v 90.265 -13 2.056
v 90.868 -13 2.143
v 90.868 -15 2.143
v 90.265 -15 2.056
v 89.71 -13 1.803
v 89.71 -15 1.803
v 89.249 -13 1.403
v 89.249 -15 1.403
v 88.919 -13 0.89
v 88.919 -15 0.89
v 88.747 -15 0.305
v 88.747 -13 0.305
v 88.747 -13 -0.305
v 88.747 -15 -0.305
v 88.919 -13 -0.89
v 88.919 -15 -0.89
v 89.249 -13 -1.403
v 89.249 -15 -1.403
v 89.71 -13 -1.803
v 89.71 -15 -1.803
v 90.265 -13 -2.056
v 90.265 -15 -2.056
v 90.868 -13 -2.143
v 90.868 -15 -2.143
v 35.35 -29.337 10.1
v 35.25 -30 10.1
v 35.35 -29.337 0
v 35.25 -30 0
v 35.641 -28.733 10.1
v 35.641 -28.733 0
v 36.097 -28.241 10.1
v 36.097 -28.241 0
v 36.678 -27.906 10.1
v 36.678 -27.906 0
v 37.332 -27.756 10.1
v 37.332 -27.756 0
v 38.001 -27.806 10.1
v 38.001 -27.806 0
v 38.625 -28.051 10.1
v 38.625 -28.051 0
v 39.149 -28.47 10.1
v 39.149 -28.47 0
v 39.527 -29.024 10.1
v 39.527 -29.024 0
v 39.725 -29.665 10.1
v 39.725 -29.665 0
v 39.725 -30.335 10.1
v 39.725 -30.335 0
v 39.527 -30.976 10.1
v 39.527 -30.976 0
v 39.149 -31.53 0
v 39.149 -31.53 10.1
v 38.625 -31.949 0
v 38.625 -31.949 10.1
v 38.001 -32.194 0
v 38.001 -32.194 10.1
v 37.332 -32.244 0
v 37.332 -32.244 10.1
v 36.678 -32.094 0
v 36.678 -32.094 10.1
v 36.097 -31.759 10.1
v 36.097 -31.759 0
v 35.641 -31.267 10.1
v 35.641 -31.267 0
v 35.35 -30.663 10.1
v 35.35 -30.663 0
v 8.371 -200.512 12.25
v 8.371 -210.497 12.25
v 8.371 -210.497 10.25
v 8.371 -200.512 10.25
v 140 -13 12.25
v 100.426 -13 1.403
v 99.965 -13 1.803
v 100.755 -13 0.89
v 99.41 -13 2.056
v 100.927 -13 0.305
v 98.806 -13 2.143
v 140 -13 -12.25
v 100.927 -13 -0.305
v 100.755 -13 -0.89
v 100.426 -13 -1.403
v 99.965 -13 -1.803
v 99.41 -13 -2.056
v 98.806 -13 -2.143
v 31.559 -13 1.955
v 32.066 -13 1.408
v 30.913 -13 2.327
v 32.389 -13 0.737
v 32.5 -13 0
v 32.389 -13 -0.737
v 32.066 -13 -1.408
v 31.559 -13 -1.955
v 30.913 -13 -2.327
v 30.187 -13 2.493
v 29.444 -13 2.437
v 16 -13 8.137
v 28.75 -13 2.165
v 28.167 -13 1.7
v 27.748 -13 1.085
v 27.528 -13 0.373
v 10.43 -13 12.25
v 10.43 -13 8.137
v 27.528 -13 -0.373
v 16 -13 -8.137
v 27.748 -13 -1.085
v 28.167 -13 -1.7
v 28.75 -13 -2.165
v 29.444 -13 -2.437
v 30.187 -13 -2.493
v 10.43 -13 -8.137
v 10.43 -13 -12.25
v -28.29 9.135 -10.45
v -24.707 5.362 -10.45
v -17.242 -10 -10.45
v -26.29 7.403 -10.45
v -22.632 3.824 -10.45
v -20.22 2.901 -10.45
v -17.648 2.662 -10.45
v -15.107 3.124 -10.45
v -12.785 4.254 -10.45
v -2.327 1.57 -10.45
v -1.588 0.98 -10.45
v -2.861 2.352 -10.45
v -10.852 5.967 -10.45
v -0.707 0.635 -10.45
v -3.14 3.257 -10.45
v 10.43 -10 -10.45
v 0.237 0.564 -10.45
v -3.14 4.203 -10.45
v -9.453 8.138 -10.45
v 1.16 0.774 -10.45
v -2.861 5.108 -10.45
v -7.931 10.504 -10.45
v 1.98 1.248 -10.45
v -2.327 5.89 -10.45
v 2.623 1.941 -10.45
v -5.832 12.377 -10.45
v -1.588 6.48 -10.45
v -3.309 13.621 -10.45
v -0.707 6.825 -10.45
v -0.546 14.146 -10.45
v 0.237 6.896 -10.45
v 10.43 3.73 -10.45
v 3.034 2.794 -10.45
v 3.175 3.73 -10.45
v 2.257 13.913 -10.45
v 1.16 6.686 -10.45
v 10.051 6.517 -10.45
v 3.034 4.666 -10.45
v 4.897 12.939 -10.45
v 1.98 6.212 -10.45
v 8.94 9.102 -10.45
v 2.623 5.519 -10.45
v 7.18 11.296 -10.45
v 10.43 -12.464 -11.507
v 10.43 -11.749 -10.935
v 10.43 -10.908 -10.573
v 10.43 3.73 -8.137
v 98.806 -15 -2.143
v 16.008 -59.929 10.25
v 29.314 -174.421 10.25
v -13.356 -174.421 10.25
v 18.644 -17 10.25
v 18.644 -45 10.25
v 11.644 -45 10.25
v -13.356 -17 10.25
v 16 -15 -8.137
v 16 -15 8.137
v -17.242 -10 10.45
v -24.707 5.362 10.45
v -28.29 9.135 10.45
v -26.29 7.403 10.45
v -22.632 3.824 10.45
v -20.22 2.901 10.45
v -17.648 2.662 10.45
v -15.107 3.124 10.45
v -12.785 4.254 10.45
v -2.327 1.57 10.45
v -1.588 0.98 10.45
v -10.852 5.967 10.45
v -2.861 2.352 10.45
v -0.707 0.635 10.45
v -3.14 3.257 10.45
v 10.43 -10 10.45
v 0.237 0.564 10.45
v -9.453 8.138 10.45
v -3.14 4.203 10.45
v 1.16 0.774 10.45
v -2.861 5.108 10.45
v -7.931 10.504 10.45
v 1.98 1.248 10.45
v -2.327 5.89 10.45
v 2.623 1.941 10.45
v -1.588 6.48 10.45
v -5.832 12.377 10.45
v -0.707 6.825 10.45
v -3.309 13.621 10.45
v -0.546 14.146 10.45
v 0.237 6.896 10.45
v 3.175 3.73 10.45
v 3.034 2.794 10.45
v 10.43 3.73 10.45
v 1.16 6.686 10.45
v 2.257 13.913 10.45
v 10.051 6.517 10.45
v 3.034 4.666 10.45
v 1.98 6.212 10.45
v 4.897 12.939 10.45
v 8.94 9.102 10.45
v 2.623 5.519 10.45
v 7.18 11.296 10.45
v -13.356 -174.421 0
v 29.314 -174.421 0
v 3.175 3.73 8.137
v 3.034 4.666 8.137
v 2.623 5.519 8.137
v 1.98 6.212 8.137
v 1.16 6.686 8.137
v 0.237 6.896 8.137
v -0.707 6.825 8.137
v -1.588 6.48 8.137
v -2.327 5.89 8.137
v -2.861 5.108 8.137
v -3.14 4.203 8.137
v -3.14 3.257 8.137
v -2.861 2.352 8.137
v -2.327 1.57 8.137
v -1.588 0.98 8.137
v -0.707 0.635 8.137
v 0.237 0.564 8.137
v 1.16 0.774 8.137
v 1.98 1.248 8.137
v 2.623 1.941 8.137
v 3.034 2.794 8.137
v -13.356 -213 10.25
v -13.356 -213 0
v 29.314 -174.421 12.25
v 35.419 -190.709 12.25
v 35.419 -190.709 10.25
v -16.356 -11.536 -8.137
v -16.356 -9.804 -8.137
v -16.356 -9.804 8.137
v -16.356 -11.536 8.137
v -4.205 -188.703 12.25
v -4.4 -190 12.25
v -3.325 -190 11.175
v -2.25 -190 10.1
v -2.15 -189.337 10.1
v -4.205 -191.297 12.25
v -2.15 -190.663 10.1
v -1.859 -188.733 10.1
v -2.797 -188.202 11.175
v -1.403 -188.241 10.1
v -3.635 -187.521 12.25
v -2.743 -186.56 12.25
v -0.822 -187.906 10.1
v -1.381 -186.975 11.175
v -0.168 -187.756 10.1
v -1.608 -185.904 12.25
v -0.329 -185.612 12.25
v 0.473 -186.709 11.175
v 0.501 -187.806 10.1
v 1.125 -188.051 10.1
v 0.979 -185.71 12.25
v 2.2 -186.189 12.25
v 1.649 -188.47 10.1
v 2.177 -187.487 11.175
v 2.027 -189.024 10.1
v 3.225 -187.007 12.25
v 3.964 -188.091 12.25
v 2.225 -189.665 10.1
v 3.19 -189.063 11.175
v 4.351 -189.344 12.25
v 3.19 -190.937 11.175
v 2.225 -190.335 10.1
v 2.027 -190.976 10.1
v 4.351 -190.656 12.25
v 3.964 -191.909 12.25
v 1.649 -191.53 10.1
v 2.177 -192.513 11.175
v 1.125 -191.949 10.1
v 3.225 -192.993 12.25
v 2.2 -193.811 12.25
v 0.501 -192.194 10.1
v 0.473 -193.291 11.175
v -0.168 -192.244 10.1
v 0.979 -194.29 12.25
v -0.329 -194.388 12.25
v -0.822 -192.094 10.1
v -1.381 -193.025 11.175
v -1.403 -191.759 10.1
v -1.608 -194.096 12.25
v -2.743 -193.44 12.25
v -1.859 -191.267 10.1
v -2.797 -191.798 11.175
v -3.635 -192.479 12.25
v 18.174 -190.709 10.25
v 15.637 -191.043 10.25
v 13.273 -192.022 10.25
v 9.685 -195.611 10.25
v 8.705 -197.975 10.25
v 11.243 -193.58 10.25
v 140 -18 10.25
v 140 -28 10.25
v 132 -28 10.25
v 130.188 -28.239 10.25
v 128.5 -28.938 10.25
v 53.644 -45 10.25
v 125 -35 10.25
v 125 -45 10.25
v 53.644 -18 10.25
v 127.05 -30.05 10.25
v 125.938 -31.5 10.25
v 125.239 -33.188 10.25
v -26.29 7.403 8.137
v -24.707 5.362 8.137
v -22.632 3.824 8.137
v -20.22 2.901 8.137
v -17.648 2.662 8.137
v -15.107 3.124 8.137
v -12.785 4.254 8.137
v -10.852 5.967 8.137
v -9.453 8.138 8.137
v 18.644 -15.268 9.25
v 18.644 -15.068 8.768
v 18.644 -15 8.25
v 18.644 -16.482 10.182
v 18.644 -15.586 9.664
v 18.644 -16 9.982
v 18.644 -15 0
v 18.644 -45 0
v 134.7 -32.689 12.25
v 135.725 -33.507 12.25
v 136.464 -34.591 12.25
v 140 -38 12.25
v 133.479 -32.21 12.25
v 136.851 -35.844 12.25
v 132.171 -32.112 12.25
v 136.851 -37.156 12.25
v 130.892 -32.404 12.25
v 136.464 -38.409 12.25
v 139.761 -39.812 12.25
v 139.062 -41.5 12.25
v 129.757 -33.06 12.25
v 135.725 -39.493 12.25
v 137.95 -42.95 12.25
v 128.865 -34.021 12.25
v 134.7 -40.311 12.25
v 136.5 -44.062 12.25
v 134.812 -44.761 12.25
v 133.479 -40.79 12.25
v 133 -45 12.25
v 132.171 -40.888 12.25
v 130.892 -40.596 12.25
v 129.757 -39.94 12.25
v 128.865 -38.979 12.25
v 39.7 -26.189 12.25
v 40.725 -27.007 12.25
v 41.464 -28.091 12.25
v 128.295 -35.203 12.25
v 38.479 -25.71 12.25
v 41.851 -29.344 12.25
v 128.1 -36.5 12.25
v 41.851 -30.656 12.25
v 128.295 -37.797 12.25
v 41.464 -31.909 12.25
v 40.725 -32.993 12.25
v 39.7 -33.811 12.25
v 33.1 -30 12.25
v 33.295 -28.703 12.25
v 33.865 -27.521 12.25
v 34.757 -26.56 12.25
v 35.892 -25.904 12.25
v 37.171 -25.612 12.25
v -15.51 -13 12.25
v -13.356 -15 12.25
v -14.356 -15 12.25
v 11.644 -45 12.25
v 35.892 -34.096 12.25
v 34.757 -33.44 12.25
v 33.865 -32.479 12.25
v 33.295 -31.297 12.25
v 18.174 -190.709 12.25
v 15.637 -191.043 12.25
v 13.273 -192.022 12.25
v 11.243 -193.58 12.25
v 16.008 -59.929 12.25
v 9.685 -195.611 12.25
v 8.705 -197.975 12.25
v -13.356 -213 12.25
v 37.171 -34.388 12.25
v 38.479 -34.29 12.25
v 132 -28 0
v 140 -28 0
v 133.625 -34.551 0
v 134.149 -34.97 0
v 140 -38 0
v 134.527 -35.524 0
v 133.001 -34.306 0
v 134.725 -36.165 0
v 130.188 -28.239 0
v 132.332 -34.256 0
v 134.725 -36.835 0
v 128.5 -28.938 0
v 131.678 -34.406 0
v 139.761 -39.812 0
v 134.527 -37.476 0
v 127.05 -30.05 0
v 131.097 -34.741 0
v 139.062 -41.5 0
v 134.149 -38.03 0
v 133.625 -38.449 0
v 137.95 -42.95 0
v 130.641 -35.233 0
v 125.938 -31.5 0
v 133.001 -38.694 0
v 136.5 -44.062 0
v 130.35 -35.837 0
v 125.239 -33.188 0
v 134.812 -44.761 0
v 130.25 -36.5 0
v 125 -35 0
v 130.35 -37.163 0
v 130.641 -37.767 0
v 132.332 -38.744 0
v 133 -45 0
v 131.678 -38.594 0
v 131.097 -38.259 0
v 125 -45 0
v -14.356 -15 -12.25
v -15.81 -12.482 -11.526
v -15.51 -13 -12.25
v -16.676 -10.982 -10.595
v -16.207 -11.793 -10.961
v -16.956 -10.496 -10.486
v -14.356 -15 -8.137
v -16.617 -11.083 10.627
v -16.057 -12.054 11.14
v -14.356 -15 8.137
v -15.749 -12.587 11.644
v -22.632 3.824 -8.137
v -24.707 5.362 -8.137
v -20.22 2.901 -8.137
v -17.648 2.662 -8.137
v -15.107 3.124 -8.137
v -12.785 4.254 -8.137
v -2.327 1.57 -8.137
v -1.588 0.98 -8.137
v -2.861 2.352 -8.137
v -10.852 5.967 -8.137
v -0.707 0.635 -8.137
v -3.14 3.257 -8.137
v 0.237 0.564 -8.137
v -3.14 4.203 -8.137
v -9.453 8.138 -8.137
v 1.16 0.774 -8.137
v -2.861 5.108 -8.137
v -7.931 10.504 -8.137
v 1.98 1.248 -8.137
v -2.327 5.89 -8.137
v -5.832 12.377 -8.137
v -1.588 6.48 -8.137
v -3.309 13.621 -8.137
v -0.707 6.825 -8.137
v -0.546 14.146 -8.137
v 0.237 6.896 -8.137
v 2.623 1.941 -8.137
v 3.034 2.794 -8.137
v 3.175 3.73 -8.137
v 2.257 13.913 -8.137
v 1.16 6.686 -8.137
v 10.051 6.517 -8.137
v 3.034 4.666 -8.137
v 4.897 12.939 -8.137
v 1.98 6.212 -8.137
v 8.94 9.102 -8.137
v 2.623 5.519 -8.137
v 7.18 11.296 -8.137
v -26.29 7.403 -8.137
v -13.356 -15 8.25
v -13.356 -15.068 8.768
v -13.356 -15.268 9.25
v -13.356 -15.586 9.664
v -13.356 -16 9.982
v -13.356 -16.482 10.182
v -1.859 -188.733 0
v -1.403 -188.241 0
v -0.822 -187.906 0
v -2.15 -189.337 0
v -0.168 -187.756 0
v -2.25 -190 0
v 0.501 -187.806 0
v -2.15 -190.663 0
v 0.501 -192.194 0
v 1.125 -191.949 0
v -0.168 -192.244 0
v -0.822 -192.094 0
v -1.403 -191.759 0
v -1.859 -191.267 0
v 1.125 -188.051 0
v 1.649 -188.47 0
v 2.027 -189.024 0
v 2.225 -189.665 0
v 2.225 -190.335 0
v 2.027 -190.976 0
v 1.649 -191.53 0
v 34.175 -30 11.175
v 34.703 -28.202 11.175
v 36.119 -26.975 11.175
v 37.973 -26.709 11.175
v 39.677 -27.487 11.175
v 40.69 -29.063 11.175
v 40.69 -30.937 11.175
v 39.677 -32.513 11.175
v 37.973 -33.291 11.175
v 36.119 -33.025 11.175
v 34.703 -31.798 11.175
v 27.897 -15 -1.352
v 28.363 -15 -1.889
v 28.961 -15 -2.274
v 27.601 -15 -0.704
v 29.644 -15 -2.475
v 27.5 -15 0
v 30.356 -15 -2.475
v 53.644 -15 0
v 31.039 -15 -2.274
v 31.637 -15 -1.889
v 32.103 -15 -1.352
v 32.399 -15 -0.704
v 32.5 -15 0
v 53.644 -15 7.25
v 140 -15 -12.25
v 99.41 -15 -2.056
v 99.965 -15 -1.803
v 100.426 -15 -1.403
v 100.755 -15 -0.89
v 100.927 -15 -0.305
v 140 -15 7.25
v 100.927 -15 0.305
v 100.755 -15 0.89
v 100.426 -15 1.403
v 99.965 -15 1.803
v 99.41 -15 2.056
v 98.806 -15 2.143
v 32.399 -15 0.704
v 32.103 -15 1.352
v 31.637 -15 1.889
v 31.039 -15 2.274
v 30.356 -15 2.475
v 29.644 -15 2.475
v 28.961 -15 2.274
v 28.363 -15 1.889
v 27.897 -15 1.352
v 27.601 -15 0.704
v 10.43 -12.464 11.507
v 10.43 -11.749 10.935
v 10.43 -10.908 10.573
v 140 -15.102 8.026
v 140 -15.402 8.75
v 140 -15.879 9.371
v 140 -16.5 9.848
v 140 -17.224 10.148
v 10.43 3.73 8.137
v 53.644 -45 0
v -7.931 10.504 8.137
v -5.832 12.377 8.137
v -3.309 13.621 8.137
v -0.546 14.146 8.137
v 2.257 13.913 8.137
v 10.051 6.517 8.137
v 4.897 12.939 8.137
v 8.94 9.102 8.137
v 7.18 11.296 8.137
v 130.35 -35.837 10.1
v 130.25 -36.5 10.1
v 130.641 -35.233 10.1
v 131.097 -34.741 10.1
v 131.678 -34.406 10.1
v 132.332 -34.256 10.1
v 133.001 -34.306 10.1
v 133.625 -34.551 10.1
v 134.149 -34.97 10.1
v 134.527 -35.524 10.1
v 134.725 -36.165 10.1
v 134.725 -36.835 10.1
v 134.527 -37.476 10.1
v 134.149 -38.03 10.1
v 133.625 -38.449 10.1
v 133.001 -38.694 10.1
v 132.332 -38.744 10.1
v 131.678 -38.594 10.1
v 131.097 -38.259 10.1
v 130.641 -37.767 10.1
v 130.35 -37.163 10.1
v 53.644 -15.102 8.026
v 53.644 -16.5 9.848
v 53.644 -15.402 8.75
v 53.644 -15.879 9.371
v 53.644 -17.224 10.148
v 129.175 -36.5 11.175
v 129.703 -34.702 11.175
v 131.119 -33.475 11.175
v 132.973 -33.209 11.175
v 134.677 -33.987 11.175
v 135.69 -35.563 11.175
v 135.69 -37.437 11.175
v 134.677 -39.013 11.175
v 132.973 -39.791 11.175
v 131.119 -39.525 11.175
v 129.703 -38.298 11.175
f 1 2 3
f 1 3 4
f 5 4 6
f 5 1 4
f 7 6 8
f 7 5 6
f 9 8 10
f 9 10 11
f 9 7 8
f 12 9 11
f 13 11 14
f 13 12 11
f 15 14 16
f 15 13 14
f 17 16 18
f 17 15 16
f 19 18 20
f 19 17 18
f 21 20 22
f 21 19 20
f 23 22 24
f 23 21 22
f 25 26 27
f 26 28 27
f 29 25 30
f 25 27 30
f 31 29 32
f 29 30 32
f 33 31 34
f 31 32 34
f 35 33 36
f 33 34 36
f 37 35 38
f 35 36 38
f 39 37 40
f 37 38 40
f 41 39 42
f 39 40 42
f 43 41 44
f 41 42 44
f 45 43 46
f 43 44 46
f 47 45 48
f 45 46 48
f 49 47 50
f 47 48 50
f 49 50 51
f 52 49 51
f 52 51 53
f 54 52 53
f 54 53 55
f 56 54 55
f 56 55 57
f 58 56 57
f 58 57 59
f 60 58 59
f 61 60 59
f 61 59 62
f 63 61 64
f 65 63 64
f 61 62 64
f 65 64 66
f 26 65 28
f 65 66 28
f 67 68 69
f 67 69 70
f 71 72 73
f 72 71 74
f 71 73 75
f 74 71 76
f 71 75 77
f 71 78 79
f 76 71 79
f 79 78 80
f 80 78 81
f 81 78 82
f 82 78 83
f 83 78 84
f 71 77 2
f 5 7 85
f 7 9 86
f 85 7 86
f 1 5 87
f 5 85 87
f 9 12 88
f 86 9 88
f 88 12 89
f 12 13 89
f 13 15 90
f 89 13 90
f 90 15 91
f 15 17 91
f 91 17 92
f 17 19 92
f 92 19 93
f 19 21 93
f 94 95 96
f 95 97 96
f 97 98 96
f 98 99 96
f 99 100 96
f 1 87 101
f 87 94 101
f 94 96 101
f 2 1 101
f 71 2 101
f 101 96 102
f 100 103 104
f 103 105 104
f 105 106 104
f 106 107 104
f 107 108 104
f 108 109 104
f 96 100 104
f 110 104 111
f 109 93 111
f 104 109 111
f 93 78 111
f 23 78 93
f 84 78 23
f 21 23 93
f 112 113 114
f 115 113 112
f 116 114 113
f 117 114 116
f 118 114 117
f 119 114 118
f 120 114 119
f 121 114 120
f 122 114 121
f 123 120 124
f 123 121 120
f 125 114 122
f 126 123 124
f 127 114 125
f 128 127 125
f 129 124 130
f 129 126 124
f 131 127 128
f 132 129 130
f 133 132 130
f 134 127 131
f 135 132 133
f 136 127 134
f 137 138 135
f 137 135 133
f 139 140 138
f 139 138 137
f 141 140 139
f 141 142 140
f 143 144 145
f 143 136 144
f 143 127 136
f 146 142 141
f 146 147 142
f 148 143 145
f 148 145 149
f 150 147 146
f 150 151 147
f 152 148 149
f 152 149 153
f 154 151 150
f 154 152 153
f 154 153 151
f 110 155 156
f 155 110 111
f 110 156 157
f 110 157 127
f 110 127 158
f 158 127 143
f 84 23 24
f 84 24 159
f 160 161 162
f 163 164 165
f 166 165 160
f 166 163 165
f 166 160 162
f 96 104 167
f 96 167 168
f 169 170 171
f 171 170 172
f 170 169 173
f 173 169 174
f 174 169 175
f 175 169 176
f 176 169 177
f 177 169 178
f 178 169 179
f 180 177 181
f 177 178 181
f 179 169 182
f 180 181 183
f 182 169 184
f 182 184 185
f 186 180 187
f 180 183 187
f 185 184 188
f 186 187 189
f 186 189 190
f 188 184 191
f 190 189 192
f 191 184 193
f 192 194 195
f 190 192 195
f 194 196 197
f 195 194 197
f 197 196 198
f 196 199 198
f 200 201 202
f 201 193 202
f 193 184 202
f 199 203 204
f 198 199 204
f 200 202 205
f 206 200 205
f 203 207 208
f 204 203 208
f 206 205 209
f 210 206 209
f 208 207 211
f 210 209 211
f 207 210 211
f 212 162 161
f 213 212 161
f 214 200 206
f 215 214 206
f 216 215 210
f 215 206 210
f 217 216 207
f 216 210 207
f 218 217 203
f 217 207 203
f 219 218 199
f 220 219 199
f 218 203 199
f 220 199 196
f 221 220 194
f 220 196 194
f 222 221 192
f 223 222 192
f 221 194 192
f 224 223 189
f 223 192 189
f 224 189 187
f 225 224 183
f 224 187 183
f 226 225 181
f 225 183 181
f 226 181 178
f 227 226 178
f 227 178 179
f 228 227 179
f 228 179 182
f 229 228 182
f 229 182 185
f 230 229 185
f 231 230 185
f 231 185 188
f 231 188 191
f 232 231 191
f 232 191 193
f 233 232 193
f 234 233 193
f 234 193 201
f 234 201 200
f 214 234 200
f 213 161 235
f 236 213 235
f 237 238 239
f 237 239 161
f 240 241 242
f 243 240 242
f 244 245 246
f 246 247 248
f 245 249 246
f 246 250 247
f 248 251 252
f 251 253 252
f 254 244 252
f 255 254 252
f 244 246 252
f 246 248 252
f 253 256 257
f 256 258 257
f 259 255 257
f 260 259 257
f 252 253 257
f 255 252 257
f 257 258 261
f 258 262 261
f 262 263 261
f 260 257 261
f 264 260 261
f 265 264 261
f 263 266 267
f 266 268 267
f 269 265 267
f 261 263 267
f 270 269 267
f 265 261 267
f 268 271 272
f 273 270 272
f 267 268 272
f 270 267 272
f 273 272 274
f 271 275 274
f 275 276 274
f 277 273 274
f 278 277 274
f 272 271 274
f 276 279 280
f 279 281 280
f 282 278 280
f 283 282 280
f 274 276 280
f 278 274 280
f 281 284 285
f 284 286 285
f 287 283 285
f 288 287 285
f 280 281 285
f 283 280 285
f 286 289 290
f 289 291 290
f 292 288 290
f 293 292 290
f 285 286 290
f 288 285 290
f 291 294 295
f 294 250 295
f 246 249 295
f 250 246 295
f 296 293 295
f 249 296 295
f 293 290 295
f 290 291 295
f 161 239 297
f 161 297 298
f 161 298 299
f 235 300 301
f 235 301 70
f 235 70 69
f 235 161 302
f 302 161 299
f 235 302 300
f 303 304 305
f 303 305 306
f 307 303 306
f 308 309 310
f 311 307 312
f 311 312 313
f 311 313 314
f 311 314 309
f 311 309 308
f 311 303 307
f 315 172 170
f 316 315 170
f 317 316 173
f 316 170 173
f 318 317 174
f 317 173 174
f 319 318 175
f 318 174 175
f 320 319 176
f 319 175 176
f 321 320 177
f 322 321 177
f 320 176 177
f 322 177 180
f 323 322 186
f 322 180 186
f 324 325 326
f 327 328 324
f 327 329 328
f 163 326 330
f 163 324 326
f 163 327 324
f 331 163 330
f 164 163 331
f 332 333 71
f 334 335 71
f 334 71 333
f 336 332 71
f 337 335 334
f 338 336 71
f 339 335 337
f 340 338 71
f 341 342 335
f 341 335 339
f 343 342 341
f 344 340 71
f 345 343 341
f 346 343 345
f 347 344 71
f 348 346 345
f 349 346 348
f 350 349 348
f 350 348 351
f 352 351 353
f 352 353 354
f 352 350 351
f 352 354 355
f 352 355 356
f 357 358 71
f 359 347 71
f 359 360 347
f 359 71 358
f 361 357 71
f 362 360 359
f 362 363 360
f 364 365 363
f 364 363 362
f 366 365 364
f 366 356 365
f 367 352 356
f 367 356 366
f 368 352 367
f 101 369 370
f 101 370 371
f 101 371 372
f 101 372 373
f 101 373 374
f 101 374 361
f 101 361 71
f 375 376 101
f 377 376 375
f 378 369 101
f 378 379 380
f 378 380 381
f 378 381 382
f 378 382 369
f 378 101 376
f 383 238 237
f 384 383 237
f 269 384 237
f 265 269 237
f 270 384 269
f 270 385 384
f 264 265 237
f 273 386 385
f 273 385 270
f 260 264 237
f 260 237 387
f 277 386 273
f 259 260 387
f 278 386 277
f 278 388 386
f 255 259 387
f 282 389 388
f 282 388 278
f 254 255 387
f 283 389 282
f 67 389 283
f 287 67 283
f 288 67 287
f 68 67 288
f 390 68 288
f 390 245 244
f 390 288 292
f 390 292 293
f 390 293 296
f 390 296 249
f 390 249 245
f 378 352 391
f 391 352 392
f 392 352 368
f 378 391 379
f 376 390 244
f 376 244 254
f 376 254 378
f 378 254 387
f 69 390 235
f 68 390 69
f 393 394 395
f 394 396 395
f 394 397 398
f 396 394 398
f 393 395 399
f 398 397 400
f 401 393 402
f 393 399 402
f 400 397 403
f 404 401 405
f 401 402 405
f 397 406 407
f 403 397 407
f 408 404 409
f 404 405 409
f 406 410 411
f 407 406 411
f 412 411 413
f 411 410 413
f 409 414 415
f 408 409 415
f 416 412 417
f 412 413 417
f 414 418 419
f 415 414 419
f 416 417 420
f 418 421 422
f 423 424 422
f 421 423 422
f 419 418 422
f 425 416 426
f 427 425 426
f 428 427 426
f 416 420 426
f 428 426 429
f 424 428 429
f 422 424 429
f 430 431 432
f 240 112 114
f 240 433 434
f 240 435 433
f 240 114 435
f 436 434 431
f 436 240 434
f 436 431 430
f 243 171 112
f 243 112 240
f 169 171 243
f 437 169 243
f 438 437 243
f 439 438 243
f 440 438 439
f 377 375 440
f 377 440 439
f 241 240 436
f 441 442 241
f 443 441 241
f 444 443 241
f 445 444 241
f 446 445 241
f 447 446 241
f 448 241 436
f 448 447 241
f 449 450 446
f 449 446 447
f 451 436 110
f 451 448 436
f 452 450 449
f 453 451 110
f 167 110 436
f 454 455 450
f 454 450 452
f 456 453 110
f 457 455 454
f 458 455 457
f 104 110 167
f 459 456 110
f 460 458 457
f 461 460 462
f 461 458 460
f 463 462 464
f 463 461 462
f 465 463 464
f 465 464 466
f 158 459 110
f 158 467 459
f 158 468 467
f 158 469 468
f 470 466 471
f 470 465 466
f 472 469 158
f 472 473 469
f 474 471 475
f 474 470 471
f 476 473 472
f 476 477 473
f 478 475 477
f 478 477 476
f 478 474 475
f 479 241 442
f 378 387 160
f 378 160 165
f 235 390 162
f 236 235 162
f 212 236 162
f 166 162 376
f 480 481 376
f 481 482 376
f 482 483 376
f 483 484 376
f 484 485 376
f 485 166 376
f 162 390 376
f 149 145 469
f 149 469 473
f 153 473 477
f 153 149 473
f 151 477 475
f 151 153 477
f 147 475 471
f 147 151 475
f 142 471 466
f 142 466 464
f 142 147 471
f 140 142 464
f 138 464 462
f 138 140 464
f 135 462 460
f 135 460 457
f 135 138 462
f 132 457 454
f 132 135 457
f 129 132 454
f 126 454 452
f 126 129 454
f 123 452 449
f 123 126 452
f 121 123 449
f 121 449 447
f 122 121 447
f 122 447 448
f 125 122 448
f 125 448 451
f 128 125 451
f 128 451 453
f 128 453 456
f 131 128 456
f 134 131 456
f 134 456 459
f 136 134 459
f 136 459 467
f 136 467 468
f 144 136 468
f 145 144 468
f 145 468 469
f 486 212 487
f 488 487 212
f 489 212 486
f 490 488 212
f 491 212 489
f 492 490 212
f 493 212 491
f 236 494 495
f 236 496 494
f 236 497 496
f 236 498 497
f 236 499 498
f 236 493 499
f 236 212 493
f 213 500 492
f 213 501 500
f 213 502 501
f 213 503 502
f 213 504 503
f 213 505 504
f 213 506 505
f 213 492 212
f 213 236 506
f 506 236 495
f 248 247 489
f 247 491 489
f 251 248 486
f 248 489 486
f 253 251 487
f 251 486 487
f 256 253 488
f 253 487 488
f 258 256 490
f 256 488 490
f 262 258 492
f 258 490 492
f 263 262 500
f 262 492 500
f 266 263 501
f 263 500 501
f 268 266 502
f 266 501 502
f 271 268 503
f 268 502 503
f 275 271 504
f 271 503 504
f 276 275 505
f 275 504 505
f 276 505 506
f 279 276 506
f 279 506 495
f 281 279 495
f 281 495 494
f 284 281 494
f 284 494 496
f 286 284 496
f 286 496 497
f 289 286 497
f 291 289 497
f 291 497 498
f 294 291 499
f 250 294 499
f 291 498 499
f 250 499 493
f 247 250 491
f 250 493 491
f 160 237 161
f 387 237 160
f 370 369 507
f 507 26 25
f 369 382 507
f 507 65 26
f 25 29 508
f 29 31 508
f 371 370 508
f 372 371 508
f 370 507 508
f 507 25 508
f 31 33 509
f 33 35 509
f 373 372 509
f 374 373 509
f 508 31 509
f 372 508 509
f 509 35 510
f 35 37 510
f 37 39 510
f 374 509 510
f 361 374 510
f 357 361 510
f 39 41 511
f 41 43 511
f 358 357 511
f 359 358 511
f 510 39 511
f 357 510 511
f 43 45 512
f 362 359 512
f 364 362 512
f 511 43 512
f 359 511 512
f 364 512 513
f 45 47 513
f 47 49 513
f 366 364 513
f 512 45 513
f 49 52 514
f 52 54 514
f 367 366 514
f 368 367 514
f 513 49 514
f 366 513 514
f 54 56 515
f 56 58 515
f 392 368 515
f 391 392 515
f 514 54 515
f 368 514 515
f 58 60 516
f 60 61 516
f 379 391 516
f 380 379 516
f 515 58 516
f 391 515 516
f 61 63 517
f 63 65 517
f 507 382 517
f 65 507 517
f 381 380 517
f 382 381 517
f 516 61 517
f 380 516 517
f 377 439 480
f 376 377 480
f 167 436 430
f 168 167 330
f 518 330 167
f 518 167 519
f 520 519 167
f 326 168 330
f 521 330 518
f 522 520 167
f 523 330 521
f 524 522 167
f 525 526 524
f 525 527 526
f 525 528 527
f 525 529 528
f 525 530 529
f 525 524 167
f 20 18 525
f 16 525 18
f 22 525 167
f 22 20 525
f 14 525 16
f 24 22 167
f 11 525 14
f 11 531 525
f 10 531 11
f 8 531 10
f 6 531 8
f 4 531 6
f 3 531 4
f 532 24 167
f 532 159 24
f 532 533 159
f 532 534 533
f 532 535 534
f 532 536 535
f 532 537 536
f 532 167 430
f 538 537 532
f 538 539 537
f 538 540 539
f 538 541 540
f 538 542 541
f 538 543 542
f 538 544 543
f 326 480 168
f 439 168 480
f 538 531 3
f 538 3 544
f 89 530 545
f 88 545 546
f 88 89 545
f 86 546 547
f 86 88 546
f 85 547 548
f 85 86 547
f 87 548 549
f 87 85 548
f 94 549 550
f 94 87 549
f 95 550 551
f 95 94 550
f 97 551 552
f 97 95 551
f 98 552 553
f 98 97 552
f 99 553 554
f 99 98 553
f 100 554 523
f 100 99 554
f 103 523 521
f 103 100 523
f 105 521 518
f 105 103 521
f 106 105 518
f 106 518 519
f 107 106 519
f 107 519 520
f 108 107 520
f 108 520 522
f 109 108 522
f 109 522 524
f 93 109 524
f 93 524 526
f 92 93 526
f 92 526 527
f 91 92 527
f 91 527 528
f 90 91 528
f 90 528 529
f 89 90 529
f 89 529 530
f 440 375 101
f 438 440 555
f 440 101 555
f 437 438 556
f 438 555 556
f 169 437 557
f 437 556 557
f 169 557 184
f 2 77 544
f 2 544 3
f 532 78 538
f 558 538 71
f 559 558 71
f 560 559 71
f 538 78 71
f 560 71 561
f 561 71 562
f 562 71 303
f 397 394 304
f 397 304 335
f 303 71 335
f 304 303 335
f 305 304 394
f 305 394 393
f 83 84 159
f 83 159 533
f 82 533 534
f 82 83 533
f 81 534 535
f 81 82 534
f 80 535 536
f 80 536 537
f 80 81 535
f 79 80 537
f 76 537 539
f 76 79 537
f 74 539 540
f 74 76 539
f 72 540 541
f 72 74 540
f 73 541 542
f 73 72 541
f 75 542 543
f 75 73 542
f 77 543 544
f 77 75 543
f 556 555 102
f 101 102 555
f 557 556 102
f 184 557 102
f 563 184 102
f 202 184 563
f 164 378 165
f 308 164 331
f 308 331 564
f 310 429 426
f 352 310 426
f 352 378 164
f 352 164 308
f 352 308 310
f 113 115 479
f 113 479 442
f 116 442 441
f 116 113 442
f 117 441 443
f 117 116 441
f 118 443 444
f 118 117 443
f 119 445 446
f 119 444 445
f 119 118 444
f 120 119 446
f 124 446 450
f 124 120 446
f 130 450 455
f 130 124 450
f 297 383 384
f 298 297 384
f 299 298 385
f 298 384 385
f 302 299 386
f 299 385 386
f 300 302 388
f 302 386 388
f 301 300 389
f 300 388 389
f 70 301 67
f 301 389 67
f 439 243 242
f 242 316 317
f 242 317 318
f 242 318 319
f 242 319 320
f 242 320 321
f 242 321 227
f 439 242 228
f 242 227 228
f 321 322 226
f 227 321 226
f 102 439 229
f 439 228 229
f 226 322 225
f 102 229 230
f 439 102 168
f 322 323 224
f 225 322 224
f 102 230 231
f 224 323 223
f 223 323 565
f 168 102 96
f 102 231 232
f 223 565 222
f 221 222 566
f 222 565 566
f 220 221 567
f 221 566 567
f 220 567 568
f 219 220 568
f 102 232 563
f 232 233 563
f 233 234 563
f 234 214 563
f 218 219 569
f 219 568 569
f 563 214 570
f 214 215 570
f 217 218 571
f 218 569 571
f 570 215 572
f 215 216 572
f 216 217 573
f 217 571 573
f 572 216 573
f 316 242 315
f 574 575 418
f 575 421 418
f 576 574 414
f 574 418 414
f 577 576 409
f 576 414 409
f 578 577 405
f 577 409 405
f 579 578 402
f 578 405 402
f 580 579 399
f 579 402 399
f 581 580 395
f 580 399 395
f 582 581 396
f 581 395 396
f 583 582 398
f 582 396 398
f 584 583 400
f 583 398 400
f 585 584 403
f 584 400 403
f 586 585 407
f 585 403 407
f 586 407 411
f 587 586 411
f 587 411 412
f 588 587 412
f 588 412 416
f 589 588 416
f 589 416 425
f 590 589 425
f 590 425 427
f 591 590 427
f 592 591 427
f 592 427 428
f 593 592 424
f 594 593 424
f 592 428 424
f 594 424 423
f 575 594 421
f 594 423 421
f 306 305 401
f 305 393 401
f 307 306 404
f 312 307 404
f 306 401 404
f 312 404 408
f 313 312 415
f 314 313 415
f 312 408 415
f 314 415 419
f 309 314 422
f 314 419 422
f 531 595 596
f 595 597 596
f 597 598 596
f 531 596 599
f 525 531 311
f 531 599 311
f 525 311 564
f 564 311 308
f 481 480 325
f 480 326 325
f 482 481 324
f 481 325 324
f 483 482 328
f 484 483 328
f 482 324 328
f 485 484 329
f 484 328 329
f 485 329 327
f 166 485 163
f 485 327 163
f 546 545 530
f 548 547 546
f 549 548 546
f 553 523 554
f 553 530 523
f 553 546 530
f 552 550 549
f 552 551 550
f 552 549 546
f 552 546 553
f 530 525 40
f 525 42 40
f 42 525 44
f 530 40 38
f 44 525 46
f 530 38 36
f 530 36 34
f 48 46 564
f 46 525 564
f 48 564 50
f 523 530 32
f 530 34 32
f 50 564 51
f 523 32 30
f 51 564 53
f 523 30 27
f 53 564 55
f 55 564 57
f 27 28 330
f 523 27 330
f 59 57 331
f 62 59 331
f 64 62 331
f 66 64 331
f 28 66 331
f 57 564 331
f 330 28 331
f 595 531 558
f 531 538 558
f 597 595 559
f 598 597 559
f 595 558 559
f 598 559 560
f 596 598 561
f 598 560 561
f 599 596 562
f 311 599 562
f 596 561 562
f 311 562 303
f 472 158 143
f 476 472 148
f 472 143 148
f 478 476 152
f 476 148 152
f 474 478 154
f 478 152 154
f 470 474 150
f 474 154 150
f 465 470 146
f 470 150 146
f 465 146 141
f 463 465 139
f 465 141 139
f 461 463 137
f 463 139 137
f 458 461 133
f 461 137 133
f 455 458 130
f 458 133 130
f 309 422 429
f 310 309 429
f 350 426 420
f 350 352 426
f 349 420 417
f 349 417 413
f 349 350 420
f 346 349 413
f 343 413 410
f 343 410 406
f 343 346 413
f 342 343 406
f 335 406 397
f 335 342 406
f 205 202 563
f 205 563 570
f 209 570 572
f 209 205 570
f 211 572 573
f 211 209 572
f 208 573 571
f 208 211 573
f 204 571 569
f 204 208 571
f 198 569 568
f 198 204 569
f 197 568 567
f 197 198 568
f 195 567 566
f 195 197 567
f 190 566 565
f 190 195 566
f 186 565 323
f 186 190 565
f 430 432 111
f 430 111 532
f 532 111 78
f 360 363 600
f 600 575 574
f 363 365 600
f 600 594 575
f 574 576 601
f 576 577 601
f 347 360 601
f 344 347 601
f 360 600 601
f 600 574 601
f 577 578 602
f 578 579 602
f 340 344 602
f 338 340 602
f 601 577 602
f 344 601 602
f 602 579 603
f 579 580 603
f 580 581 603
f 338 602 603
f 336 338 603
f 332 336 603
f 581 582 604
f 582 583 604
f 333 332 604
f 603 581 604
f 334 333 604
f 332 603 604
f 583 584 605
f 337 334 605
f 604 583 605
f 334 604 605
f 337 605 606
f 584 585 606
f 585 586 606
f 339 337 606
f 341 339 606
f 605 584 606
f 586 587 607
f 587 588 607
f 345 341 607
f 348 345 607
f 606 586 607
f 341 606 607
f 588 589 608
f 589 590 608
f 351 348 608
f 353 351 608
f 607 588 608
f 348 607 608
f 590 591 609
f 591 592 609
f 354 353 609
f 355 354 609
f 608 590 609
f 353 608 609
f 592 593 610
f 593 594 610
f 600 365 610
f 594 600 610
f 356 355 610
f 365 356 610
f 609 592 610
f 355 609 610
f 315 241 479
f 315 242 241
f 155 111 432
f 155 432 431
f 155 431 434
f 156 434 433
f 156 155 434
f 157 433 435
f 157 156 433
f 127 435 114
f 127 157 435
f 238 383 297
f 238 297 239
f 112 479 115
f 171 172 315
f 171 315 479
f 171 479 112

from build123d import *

# Parameters (mm, degrees)
SKETCH007_W          = 124
SKETCH007_H          = 24.5
SKETCH007_R          = 2.5
PAD004_DEPTH         = 2
SKETCH006_R          = 3.175
PAD005_DEPTH         = 4.1125
PAD006_DEPTH         = 12.25
POCKET001_DEPTH      = 373.382623
POCKET001_DEPTH_BACK = 485.092667
PAD007_DEPTH         = 2
SKETCH011_W          = 35
SKETCH011_H          = 30
SKETCH011_W_2        = 15
SKETCH011_H_2        = 17
PAD008_DEPTH         = 12.25
HOLE_D               = 4.5
HOLE_CSINK_D         = 8.8
HOLE_CSINK_ANGLE     = 90
FILLET002_R          = 3
FILLET003_R          = 2
FILLET004_R          = 7
SKETCH017_W          = 3
SKETCH017_H          = 16.275
POCKET004_DEPTH      = 14.161
POCKET004_DEPTH_BACK = 213.001


with BuildPart() as part:
    # Sketch007 → Pad004 (new body)
    with BuildSketch(Plane.XZ.offset(13)):
        with Locations((78, 0)):
            Rectangle(SKETCH007_W, SKETCH007_H)
        with Locations((30, 0)):
            Circle(SKETCH007_R, mode=Mode.SUBTRACT)
        with BuildLine():
            ThreePointArc((90.8685, 2.143), (88.7255, 0), (90.8685, -2.143))
            Line((90.8685, -2.143), (98.806, -2.143))
            ThreePointArc((98.806, -2.143), (100.949, 0), (98.806, 2.143))
            Line((98.806, 2.143), (90.8685, 2.143))
        make_face(mode=Mode.SUBTRACT)
    extrude(amount=PAD004_DEPTH)

    # Sketch006 → Pad005 (join)
    with BuildSketch(Plane.XY.offset(12.25)):
        with BuildLine():
            Line((16, -13), (10.43, -13))
            Line((10.43, -13), (10.43, 3.73))
            ThreePointArc((10.43, 3.73), (2.257465, 13.912767), (-9.45279, 8.137908))
            ThreePointArc((-26.289956, 7.402782), (-17.64833, 2.661824), (-9.45279, 8.137908))
            Line((-26.289956, 7.402782), (-13.355703, -15))
            Line((-13.355703, -15), (16, -15))
            Line((16, -15), (16, -13))
        make_face()
        with Locations((0, 3.73)):
            Circle(SKETCH006_R, mode=Mode.SUBTRACT)
    pad005 = extrude(amount=-PAD005_DEPTH)

    # Mirrored001: Pad005 across XY
    add(pad005.mirror(Plane.XY))

    # Sketch008 → Pad006 (join, symmetric)
    with BuildSketch(Plane.XY):
        Polygon((-26.289956, 7.402782), (-28.289956, 9.134833), (-14.355703, -15), (-13.355703, -15), align=None)
    extrude(amount=PAD006_DEPTH, both=True)

    # Sketch009 → Pocket001 (cut, two sides)
    with BuildSketch(Plane.YZ) as pocket001_sk:
        with BuildLine():
            ThreePointArc((-13, 12.25), (-11.749286, 10.934524), (-10, 10.45))
            Line((-10, 10.45), (14.16, 10.45))
            Line((14.16, 12.25), (14.16, 10.45))
            Line((14.16, 12.25), (-13, 12.25))
        make_face()
    pocket001 = extrude(amount=-POCKET001_DEPTH, mode=Mode.SUBTRACT) + extrude(pocket001_sk.sketch, amount=POCKET001_DEPTH_BACK, mode=Mode.SUBTRACT)

    # Mirrored002: Pocket001 across Sketch009 H_Axis
    add(pocket001.mirror(Plane.XY), mode=Mode.SUBTRACT)

    # Sketch010 → Pad007 (join)
    with BuildSketch(Plane.XY.offset(12.25)):
        with BuildLine():
            Line((-13.355703, -15), (140, -15))
            Line((140, -15), (140, -45))
            Line((11.644297, -45), (140, -45))
            Line((16.00778, -59.929218), (11.644297, -45))
            Line((29.314371, -174.42131), (16.00778, -59.929218))
            Line((35.419102, -190.709129), (29.314371, -174.42131))
            Line((18.174297, -190.709129), (35.419102, -190.709129))
            ThreePointArc((18.174297, -190.709129), (11.242593, -193.580335), (8.371387, -200.512039))
            Line((8.371387, -210.497159), (8.371387, -200.512039))
            Line((-13.355703, -213), (8.371387, -210.497159))
            Line((-13.355703, -213), (-13.355703, -15))
        make_face()
    extrude(amount=-PAD007_DEPTH)

    # Sketch011 (on Face7 of Pad007) → Pad008 (join)
    with BuildSketch(Plane(origin=(0, 0, 12.25), x_dir=(-1, 0, 0), z_dir=(0, 0, 1))):
        with Locations((-36.144297, 30)):
            Rectangle(SKETCH011_W, SKETCH011_H)
        with Locations((-132.5, 36.5)):
            Rectangle(SKETCH011_W_2, SKETCH011_H_2)
        Polygon((13.355703, 174.42131), (-29.314371, 174.42131), (13.355703, 213), align=None)
    extrude(amount=-PAD008_DEPTH)

    # Hole (through all)
    with Locations(Plane.XY.offset(12.25)):
        with Locations((0, -190), (37.5, -30), (132.5, -36.5)):
            CounterSinkHole(HOLE_D / 2, HOLE_CSINK_D / 2, counter_sink_angle=HOLE_CSINK_ANGLE)

    # Fillet002
    fillet002_edges = [part.edges().sort_by_distance(p)[0] for p in [
        (96.822148, -15, 10.25),
    ]]
    fillet(fillet002_edges, radius=FILLET002_R)

    # Fillet003
    fillet003_edges = [part.edges().sort_by_distance(p)[0] for p in [
        (2.644297, -15, 10.25),
    ]]
    fillet(fillet003_edges, radius=FILLET003_R)

    # Fillet004
    fillet004_edges = [part.edges().sort_by_distance(p)[0] for p in [
        (125, -28, 5.125),
        (140, -45, 5.125),
    ]]
    fillet(fillet004_edges, radius=FILLET004_R)

    # Sketch017 → Pocket004 (cut, two sides)
    with BuildSketch(Plane.XZ) as pocket004_sk:
        with Locations((-14.855703, 0)):
            Rectangle(SKETCH017_W, SKETCH017_H)
    extrude(amount=-POCKET004_DEPTH, mode=Mode.SUBTRACT)
    extrude(pocket004_sk.sketch, amount=POCKET004_DEPTH_BACK, mode=Mode.SUBTRACT)


solid = part.part
